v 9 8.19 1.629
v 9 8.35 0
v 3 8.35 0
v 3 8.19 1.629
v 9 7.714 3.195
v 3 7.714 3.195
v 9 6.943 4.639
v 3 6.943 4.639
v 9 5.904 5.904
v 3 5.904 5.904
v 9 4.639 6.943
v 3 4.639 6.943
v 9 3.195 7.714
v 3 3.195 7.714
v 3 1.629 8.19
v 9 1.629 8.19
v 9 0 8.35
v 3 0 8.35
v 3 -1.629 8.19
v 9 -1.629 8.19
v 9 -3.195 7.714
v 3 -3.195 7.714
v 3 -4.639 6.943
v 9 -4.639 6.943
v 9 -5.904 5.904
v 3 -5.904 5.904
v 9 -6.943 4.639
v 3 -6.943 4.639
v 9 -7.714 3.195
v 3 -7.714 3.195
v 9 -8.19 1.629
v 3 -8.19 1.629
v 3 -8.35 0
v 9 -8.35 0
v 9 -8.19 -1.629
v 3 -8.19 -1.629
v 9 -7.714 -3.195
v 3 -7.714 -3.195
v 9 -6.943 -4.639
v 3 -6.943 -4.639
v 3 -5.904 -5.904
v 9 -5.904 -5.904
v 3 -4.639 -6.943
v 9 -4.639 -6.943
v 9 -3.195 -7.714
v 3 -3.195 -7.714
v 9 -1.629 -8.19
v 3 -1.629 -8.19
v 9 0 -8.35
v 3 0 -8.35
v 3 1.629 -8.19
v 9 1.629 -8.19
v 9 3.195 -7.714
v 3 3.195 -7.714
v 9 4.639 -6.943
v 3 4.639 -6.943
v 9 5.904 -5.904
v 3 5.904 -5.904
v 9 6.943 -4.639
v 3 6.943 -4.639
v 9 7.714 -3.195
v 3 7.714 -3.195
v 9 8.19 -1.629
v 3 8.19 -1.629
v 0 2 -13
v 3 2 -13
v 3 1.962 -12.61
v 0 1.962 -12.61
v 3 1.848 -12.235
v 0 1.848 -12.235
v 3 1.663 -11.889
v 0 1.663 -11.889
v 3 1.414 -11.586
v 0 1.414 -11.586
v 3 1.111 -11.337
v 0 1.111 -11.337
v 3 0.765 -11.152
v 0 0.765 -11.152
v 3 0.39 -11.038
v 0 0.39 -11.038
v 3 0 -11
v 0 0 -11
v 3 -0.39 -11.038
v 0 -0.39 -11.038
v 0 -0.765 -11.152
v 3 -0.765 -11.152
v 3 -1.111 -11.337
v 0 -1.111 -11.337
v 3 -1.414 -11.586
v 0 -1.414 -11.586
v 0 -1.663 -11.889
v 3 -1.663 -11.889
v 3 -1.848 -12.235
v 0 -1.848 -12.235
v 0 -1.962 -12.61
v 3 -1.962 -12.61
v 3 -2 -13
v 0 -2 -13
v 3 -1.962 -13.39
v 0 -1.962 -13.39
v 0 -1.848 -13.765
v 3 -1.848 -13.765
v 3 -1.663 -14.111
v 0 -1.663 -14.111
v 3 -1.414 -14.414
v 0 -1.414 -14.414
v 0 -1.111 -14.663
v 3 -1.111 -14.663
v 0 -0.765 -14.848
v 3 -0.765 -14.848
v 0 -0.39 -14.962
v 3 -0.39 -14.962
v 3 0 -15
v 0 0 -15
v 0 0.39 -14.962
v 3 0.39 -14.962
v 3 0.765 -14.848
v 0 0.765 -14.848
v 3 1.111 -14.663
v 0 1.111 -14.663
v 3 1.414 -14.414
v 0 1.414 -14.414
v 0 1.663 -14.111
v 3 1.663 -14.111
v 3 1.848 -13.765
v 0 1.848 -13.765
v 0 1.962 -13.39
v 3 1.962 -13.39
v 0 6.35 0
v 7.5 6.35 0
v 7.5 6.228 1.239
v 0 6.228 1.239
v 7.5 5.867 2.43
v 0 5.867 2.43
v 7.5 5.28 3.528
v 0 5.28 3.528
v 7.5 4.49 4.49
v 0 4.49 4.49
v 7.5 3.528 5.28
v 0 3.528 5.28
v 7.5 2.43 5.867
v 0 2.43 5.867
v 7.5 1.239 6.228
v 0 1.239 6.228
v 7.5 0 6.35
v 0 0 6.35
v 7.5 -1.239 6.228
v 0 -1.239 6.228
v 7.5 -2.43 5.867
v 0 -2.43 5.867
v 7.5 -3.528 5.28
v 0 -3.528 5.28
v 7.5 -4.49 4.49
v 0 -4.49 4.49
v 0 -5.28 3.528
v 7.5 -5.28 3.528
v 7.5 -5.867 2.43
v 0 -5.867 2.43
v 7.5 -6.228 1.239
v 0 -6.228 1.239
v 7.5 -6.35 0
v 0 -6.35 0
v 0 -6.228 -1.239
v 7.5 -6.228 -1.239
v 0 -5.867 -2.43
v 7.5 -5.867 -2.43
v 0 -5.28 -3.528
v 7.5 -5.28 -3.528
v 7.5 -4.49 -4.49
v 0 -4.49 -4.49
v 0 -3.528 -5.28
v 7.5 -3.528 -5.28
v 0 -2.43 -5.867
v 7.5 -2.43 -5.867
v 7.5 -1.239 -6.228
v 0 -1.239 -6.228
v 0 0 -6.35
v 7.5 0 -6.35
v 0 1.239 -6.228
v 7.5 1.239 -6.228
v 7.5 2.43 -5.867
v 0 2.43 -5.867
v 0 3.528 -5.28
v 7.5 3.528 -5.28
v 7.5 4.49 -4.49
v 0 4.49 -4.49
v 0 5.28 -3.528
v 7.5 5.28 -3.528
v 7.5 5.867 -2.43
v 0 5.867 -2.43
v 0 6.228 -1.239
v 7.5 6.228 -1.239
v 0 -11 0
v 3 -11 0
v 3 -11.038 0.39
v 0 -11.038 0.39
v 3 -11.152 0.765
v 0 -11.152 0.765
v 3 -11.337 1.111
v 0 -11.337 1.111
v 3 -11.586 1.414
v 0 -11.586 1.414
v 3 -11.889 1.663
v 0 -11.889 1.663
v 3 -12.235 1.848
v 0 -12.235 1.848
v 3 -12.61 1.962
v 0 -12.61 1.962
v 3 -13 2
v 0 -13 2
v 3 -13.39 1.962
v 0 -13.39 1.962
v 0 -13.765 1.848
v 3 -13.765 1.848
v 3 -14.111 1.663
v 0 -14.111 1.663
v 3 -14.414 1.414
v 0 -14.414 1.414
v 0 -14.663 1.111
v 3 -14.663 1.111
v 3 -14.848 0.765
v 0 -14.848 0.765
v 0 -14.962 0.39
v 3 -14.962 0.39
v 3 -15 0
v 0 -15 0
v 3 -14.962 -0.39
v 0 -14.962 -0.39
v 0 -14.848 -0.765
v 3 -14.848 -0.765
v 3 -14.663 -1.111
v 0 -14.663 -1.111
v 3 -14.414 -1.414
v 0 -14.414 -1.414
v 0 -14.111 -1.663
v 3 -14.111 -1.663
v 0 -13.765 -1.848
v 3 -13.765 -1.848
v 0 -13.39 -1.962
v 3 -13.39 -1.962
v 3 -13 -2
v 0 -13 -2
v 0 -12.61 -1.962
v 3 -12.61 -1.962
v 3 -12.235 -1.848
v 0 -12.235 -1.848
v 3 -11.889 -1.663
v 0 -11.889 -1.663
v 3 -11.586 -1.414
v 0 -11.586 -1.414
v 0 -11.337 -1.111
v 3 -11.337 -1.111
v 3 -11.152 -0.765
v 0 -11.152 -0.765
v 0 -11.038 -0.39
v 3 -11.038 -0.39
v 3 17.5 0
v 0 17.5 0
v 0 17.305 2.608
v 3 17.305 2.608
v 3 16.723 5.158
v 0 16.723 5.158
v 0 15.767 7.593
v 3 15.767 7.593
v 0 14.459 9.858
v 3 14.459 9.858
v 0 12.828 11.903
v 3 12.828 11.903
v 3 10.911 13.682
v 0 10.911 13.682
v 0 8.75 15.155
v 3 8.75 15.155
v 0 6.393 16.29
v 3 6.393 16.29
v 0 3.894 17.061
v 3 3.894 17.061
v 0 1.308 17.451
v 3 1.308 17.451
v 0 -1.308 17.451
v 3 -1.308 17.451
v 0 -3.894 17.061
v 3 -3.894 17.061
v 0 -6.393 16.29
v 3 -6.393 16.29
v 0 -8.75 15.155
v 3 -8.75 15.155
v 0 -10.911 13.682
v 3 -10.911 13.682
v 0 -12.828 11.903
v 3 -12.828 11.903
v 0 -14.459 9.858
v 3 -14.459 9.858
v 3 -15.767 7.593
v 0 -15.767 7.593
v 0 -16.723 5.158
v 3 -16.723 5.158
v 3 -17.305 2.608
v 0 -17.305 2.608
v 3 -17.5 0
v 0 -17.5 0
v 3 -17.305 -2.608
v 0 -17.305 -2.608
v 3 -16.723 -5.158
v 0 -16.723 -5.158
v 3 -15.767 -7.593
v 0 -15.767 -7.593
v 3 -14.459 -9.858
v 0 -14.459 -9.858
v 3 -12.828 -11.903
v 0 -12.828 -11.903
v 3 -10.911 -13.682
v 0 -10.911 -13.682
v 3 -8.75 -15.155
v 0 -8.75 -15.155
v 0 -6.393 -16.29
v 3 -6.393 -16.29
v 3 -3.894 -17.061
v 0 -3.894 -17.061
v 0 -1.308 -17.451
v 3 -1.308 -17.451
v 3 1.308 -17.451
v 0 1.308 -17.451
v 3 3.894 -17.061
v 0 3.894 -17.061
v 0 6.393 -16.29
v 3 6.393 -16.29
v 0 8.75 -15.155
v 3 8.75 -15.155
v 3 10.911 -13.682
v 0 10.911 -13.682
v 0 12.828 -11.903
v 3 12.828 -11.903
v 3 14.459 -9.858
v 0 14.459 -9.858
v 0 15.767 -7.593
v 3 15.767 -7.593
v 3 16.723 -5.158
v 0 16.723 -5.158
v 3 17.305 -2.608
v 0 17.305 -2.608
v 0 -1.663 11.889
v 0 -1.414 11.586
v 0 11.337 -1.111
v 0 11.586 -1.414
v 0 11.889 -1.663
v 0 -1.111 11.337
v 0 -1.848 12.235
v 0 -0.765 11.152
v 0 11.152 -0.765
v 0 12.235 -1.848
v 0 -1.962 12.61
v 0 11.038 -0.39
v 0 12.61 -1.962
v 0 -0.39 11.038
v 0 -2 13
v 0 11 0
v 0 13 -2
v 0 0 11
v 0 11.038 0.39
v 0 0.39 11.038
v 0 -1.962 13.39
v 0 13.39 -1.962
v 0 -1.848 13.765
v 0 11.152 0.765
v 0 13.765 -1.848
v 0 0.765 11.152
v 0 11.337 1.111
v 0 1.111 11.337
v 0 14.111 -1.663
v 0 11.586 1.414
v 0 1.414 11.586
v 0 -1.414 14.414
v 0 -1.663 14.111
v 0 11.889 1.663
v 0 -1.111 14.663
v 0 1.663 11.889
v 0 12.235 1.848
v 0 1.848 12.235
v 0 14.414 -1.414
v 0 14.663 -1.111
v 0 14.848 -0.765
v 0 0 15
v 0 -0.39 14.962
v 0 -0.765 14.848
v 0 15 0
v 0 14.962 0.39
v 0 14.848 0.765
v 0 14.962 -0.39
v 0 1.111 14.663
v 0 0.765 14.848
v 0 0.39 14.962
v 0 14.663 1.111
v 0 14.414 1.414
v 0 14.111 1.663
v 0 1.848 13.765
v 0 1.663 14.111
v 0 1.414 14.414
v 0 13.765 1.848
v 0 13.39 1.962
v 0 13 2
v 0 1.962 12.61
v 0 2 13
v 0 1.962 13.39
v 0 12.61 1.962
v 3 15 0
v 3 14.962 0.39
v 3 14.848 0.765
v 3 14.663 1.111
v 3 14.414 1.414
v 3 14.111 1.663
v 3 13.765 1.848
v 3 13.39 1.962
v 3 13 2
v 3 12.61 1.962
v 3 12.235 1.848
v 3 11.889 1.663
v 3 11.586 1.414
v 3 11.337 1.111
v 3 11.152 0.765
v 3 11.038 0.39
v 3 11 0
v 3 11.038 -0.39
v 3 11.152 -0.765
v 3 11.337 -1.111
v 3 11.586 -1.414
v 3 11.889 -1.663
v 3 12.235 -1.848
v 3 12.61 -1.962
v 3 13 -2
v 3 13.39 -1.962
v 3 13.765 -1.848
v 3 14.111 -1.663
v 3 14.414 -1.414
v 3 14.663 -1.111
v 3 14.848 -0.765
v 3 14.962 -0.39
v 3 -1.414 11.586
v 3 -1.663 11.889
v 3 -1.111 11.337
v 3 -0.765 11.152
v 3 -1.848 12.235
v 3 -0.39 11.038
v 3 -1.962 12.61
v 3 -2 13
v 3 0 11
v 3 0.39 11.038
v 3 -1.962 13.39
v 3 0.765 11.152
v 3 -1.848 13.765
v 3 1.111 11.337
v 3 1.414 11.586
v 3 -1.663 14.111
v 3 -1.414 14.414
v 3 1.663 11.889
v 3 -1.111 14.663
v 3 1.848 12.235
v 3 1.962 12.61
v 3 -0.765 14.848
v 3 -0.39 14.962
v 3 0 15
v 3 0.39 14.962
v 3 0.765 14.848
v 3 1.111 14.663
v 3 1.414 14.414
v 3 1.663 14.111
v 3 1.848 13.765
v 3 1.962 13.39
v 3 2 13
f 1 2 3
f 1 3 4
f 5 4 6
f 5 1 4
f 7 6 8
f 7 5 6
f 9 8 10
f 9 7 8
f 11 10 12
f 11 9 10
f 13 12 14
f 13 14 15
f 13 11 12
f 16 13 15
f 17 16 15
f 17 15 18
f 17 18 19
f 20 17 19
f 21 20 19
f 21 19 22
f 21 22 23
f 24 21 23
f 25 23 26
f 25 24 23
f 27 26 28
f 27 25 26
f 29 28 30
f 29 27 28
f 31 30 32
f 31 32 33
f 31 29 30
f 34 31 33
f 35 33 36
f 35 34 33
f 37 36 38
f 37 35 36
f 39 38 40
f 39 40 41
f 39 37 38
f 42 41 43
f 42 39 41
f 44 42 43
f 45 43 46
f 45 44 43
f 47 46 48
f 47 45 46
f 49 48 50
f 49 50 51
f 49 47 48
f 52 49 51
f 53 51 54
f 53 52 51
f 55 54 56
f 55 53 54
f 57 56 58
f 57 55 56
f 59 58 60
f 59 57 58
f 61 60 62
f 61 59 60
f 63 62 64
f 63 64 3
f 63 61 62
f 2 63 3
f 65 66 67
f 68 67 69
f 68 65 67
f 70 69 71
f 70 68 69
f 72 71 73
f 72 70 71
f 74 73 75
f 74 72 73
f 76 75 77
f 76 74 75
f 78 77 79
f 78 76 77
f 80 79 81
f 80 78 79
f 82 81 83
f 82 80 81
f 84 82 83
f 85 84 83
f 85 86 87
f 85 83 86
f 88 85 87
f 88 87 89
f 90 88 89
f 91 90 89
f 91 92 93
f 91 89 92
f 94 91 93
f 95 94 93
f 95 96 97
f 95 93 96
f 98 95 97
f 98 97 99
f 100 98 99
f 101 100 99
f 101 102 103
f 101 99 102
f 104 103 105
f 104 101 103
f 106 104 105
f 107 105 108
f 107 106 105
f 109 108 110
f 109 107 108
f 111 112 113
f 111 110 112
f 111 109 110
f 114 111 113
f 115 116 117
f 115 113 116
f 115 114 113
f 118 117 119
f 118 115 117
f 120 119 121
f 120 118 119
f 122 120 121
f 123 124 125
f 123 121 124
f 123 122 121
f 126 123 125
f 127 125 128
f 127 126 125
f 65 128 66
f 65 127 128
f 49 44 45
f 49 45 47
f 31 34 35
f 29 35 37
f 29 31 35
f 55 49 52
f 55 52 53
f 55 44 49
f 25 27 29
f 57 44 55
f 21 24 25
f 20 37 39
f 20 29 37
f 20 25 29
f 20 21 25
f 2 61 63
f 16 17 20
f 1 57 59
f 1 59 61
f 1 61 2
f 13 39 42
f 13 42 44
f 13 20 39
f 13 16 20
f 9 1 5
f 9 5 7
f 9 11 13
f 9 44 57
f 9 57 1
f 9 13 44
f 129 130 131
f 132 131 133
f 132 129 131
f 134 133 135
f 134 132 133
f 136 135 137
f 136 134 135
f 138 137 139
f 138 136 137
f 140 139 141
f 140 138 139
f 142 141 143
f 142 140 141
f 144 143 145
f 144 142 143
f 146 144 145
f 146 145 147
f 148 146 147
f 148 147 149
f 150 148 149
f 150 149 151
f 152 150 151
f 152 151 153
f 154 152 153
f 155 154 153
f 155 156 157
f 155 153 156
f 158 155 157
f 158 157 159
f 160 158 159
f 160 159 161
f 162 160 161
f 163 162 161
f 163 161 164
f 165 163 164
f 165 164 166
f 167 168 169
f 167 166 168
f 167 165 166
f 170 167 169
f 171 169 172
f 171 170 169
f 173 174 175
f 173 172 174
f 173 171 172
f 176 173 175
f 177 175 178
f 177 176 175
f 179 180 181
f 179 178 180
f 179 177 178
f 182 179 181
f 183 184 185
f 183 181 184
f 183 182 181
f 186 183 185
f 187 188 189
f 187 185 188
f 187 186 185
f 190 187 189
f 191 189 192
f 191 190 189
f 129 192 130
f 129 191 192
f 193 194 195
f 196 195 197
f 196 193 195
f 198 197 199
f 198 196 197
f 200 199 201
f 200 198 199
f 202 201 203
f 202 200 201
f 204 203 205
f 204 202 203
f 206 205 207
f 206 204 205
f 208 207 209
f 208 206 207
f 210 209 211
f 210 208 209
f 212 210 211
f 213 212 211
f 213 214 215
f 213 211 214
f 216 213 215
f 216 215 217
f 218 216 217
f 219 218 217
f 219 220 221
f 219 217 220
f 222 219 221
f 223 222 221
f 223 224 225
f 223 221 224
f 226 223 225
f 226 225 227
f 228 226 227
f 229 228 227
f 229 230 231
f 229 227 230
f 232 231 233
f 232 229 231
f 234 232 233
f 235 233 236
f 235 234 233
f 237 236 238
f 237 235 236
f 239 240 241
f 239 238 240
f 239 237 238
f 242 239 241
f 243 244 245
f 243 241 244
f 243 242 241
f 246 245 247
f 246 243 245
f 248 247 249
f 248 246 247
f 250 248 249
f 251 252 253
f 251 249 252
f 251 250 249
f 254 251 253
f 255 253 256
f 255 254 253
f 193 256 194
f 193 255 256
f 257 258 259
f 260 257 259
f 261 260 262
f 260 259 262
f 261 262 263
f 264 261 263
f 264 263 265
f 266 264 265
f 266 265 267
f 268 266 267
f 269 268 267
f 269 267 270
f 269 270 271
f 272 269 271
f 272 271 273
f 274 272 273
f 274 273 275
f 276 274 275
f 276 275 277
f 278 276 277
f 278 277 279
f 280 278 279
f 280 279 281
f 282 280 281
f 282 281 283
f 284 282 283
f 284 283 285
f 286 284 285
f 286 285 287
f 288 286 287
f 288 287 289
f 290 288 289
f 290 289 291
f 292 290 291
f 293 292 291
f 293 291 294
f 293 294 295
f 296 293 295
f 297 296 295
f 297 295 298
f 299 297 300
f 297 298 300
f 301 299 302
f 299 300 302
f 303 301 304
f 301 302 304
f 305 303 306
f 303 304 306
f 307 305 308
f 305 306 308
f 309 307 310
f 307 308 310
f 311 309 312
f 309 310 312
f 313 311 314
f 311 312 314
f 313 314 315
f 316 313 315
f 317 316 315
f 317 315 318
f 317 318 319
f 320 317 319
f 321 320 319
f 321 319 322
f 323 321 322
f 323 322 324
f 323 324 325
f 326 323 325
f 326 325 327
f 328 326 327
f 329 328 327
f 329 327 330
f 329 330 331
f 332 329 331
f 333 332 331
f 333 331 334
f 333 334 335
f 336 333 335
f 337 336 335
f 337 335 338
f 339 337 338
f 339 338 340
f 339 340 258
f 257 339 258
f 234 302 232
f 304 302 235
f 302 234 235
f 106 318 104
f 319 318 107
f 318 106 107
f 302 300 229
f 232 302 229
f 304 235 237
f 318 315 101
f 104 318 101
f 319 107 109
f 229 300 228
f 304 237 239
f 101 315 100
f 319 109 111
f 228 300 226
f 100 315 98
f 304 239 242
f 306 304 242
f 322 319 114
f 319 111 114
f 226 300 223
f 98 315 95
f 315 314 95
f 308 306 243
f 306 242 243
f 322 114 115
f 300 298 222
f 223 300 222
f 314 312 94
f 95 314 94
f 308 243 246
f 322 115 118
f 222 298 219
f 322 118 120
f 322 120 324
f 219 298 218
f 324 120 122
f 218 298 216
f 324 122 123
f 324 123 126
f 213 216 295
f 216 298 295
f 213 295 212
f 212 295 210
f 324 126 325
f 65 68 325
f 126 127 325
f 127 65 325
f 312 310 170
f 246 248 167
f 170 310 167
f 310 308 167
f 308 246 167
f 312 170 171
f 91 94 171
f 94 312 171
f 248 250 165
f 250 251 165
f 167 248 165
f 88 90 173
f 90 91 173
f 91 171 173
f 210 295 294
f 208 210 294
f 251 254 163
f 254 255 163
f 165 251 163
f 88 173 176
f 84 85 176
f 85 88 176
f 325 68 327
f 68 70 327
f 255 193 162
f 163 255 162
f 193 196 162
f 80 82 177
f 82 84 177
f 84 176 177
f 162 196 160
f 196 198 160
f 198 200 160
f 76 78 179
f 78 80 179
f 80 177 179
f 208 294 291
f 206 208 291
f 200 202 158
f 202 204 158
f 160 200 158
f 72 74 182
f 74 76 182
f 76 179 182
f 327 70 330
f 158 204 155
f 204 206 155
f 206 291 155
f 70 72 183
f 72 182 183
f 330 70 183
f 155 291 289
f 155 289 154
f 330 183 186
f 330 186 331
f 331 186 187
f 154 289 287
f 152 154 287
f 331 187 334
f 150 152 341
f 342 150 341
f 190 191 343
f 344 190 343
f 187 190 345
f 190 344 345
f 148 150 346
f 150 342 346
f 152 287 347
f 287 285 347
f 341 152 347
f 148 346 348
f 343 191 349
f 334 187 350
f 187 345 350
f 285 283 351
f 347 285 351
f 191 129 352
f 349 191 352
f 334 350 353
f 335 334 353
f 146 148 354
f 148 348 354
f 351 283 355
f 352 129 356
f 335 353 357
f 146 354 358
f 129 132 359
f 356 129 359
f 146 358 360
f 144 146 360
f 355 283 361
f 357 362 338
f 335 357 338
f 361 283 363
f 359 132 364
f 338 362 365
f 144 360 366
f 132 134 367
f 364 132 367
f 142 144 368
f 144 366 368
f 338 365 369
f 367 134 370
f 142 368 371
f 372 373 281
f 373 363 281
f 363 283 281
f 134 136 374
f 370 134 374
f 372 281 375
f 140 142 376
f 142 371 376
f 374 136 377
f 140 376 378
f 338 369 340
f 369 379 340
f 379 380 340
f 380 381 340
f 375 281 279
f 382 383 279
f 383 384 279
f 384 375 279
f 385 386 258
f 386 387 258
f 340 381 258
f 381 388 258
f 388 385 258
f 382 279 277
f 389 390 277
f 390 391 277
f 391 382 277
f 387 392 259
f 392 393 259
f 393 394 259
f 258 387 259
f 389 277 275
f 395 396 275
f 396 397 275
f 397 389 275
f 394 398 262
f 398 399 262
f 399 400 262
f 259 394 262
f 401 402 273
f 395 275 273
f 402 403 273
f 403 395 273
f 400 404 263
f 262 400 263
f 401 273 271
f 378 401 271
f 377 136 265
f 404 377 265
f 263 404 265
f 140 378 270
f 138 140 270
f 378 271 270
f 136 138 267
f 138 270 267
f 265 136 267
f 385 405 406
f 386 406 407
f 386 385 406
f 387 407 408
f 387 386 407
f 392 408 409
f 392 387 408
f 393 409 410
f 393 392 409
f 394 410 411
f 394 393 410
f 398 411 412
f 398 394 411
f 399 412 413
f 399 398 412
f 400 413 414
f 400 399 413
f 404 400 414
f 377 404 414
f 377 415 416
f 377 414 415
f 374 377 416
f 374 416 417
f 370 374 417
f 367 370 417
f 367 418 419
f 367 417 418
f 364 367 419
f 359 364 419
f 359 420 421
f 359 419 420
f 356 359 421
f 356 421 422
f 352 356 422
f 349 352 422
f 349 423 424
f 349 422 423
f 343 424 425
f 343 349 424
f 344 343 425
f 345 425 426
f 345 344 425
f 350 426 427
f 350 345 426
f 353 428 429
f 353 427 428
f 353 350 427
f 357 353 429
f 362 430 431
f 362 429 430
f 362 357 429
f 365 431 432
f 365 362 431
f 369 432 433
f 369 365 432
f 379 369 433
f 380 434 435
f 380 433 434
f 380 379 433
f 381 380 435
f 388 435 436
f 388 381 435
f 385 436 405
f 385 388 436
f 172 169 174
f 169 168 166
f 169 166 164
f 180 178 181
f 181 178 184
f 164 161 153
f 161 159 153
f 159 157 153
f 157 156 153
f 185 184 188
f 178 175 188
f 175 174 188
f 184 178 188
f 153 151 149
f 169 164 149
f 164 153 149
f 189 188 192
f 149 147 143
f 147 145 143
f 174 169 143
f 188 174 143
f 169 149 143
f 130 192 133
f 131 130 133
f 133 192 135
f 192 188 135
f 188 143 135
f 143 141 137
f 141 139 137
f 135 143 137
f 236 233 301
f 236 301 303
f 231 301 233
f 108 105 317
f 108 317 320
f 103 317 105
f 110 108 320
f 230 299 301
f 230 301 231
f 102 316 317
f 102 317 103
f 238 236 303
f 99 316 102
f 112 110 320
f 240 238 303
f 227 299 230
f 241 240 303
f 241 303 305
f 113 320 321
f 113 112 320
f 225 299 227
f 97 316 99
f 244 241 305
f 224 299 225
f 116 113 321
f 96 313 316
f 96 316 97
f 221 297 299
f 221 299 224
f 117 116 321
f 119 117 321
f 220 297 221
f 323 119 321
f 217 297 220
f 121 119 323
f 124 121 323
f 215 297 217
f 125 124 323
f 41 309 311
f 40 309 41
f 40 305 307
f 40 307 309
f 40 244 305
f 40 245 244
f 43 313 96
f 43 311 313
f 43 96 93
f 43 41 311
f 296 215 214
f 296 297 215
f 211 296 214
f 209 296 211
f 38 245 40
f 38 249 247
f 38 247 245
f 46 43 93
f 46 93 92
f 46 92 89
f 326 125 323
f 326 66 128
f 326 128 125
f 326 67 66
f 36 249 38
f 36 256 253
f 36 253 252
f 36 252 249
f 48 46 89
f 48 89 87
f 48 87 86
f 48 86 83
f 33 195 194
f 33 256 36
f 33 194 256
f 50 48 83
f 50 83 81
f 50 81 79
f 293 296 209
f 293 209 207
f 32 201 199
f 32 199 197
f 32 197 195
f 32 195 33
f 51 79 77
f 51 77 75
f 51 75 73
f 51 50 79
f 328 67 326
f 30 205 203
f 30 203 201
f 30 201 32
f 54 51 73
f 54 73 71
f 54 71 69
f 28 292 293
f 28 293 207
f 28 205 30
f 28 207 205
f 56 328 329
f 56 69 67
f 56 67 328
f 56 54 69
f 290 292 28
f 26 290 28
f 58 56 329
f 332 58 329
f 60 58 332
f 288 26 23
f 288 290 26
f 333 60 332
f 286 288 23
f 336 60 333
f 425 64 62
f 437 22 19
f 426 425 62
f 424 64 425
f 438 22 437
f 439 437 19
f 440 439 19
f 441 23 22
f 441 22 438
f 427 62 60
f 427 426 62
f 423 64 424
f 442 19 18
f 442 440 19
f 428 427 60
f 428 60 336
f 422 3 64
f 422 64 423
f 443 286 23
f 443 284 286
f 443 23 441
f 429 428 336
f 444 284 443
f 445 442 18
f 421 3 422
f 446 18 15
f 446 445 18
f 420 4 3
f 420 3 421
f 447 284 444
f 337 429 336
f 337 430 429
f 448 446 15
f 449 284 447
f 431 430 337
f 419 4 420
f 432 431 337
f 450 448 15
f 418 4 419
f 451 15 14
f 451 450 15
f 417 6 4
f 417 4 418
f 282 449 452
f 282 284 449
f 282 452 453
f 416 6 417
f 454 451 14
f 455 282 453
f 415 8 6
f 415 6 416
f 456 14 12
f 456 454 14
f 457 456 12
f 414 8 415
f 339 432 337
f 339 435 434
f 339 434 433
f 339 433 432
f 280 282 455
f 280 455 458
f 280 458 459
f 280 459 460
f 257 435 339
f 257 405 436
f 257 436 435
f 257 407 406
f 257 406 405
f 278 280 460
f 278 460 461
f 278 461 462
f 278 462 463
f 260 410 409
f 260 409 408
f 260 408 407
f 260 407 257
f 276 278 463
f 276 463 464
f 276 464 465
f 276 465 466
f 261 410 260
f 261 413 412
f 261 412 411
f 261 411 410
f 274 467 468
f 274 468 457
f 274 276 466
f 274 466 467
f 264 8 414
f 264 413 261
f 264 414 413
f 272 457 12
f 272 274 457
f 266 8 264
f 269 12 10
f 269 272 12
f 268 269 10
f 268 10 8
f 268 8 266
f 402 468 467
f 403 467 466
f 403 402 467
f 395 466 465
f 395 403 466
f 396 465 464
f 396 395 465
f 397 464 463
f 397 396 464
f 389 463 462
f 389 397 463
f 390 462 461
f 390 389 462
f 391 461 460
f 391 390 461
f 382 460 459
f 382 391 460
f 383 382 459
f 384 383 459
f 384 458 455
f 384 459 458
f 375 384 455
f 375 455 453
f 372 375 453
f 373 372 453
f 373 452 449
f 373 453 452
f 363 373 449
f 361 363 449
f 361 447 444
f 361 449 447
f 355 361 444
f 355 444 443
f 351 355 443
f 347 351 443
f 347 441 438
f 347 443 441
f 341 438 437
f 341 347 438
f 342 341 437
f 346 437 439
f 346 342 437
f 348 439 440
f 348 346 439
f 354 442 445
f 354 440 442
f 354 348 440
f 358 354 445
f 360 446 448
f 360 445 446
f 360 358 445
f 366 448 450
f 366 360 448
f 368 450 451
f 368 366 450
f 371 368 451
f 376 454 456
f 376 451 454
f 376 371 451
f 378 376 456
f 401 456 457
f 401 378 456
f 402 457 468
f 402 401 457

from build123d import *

# Parameters (mm, degrees)
F0_R     = 17.5
F0_R_2   = 2
F0_R_3   = 6.35
F1_DEPTH = 9
F2_R     = 17.5
F2_R_2   = 8.35
F3_DEPTH = 6
F4_R     = 6.4
F5_DEPTH = 1.5


with BuildPart() as f1:
    # F0 (on Right) → F1 (new body)
    with BuildSketch(Plane.YZ):
        Circle(F0_R)
        with Locations((0, -13)):
            Circle(F0_R_2, mode=Mode.SUBTRACT)
        with Locations((-13, 0)):
            Circle(F0_R_2, mode=Mode.SUBTRACT)
        Circle(F0_R_3, mode=Mode.SUBTRACT)
        with Locations((13, 0)):
            Circle(F0_R_2, mode=Mode.SUBTRACT)
        with Locations((0, 13)):
            Circle(F0_R_2, mode=Mode.SUBTRACT)
    extrude(amount=F1_DEPTH)

    # F2 (on face) → F3 (cut)
    with BuildSketch(Plane.YZ.offset(9)):
        Circle(F2_R)
        Circle(F2_R_2, mode=Mode.SUBTRACT)
    extrude(amount=-F3_DEPTH, mode=Mode.SUBTRACT)

    # F4 (on face) → F5 (join)
    with BuildSketch(Plane.YZ.offset(9)):
        Circle(F4_R)
    extrude(amount=-F5_DEPTH)


solid = f1.part
